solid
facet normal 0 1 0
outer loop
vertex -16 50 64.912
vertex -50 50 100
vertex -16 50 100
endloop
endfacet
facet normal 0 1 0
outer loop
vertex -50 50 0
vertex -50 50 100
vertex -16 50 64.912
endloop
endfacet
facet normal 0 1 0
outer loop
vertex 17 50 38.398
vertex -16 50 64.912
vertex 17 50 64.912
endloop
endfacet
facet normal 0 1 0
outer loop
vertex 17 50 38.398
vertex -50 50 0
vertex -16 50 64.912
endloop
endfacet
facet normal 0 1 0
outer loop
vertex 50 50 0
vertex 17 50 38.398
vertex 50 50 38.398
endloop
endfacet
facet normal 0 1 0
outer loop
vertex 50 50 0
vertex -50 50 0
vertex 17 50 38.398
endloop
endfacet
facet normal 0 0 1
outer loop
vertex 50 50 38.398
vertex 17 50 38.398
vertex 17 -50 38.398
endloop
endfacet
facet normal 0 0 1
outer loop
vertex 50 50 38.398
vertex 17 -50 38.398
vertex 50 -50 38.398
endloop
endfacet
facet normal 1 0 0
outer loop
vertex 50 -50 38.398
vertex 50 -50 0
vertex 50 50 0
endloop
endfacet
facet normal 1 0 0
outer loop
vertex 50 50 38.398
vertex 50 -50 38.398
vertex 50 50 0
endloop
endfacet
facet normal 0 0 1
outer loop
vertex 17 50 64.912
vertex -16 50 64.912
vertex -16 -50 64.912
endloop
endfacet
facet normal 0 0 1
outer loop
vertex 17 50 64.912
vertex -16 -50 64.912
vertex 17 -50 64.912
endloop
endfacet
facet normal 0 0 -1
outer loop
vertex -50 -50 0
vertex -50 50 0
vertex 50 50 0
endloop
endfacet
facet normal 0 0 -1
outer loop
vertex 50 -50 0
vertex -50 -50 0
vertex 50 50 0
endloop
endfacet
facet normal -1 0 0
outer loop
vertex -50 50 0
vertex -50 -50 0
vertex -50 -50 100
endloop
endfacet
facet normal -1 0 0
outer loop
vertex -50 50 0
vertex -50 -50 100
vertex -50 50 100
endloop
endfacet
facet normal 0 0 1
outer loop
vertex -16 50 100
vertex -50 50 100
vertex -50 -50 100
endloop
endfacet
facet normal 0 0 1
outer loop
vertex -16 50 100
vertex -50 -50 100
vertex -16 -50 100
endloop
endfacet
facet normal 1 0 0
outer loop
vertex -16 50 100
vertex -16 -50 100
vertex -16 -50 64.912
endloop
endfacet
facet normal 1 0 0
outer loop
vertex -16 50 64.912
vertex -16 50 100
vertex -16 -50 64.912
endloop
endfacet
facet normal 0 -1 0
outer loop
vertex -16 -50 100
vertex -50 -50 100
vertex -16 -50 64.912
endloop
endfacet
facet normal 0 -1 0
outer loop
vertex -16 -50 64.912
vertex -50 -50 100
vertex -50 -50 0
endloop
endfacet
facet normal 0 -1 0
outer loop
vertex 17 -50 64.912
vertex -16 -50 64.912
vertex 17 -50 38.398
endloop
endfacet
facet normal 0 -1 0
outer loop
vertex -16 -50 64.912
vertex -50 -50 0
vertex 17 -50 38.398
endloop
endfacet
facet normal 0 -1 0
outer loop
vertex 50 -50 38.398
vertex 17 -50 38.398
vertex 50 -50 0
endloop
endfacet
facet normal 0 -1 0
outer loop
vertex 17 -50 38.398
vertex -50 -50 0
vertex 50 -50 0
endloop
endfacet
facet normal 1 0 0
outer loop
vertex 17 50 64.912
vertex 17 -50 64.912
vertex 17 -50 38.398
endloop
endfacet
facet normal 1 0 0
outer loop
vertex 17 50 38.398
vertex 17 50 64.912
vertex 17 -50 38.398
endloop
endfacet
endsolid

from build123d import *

# Parameters (mm, degrees)
F0_W     = 100
F0_H     = 100
F1_DEPTH = 100
F3_DEPTH = 100


with BuildPart() as f1:
    # F0 (on Top) → F1 (new body)
    with BuildSketch(Plane.XY):
        Rectangle(F0_W, F0_H)
    extrude(amount=F1_DEPTH)

    # F2 (on face) → F3 (cut)
    with BuildSketch(Plane.XZ.offset(50)):
        Polygon((50, 100), (-16, 100), (-16, 64.911917), (17, 64.911917), (17, 38.397651), (50, 38.397651), align=None)
    extrude(amount=-F3_DEPTH, mode=Mode.SUBTRACT)


solid = f1.part
